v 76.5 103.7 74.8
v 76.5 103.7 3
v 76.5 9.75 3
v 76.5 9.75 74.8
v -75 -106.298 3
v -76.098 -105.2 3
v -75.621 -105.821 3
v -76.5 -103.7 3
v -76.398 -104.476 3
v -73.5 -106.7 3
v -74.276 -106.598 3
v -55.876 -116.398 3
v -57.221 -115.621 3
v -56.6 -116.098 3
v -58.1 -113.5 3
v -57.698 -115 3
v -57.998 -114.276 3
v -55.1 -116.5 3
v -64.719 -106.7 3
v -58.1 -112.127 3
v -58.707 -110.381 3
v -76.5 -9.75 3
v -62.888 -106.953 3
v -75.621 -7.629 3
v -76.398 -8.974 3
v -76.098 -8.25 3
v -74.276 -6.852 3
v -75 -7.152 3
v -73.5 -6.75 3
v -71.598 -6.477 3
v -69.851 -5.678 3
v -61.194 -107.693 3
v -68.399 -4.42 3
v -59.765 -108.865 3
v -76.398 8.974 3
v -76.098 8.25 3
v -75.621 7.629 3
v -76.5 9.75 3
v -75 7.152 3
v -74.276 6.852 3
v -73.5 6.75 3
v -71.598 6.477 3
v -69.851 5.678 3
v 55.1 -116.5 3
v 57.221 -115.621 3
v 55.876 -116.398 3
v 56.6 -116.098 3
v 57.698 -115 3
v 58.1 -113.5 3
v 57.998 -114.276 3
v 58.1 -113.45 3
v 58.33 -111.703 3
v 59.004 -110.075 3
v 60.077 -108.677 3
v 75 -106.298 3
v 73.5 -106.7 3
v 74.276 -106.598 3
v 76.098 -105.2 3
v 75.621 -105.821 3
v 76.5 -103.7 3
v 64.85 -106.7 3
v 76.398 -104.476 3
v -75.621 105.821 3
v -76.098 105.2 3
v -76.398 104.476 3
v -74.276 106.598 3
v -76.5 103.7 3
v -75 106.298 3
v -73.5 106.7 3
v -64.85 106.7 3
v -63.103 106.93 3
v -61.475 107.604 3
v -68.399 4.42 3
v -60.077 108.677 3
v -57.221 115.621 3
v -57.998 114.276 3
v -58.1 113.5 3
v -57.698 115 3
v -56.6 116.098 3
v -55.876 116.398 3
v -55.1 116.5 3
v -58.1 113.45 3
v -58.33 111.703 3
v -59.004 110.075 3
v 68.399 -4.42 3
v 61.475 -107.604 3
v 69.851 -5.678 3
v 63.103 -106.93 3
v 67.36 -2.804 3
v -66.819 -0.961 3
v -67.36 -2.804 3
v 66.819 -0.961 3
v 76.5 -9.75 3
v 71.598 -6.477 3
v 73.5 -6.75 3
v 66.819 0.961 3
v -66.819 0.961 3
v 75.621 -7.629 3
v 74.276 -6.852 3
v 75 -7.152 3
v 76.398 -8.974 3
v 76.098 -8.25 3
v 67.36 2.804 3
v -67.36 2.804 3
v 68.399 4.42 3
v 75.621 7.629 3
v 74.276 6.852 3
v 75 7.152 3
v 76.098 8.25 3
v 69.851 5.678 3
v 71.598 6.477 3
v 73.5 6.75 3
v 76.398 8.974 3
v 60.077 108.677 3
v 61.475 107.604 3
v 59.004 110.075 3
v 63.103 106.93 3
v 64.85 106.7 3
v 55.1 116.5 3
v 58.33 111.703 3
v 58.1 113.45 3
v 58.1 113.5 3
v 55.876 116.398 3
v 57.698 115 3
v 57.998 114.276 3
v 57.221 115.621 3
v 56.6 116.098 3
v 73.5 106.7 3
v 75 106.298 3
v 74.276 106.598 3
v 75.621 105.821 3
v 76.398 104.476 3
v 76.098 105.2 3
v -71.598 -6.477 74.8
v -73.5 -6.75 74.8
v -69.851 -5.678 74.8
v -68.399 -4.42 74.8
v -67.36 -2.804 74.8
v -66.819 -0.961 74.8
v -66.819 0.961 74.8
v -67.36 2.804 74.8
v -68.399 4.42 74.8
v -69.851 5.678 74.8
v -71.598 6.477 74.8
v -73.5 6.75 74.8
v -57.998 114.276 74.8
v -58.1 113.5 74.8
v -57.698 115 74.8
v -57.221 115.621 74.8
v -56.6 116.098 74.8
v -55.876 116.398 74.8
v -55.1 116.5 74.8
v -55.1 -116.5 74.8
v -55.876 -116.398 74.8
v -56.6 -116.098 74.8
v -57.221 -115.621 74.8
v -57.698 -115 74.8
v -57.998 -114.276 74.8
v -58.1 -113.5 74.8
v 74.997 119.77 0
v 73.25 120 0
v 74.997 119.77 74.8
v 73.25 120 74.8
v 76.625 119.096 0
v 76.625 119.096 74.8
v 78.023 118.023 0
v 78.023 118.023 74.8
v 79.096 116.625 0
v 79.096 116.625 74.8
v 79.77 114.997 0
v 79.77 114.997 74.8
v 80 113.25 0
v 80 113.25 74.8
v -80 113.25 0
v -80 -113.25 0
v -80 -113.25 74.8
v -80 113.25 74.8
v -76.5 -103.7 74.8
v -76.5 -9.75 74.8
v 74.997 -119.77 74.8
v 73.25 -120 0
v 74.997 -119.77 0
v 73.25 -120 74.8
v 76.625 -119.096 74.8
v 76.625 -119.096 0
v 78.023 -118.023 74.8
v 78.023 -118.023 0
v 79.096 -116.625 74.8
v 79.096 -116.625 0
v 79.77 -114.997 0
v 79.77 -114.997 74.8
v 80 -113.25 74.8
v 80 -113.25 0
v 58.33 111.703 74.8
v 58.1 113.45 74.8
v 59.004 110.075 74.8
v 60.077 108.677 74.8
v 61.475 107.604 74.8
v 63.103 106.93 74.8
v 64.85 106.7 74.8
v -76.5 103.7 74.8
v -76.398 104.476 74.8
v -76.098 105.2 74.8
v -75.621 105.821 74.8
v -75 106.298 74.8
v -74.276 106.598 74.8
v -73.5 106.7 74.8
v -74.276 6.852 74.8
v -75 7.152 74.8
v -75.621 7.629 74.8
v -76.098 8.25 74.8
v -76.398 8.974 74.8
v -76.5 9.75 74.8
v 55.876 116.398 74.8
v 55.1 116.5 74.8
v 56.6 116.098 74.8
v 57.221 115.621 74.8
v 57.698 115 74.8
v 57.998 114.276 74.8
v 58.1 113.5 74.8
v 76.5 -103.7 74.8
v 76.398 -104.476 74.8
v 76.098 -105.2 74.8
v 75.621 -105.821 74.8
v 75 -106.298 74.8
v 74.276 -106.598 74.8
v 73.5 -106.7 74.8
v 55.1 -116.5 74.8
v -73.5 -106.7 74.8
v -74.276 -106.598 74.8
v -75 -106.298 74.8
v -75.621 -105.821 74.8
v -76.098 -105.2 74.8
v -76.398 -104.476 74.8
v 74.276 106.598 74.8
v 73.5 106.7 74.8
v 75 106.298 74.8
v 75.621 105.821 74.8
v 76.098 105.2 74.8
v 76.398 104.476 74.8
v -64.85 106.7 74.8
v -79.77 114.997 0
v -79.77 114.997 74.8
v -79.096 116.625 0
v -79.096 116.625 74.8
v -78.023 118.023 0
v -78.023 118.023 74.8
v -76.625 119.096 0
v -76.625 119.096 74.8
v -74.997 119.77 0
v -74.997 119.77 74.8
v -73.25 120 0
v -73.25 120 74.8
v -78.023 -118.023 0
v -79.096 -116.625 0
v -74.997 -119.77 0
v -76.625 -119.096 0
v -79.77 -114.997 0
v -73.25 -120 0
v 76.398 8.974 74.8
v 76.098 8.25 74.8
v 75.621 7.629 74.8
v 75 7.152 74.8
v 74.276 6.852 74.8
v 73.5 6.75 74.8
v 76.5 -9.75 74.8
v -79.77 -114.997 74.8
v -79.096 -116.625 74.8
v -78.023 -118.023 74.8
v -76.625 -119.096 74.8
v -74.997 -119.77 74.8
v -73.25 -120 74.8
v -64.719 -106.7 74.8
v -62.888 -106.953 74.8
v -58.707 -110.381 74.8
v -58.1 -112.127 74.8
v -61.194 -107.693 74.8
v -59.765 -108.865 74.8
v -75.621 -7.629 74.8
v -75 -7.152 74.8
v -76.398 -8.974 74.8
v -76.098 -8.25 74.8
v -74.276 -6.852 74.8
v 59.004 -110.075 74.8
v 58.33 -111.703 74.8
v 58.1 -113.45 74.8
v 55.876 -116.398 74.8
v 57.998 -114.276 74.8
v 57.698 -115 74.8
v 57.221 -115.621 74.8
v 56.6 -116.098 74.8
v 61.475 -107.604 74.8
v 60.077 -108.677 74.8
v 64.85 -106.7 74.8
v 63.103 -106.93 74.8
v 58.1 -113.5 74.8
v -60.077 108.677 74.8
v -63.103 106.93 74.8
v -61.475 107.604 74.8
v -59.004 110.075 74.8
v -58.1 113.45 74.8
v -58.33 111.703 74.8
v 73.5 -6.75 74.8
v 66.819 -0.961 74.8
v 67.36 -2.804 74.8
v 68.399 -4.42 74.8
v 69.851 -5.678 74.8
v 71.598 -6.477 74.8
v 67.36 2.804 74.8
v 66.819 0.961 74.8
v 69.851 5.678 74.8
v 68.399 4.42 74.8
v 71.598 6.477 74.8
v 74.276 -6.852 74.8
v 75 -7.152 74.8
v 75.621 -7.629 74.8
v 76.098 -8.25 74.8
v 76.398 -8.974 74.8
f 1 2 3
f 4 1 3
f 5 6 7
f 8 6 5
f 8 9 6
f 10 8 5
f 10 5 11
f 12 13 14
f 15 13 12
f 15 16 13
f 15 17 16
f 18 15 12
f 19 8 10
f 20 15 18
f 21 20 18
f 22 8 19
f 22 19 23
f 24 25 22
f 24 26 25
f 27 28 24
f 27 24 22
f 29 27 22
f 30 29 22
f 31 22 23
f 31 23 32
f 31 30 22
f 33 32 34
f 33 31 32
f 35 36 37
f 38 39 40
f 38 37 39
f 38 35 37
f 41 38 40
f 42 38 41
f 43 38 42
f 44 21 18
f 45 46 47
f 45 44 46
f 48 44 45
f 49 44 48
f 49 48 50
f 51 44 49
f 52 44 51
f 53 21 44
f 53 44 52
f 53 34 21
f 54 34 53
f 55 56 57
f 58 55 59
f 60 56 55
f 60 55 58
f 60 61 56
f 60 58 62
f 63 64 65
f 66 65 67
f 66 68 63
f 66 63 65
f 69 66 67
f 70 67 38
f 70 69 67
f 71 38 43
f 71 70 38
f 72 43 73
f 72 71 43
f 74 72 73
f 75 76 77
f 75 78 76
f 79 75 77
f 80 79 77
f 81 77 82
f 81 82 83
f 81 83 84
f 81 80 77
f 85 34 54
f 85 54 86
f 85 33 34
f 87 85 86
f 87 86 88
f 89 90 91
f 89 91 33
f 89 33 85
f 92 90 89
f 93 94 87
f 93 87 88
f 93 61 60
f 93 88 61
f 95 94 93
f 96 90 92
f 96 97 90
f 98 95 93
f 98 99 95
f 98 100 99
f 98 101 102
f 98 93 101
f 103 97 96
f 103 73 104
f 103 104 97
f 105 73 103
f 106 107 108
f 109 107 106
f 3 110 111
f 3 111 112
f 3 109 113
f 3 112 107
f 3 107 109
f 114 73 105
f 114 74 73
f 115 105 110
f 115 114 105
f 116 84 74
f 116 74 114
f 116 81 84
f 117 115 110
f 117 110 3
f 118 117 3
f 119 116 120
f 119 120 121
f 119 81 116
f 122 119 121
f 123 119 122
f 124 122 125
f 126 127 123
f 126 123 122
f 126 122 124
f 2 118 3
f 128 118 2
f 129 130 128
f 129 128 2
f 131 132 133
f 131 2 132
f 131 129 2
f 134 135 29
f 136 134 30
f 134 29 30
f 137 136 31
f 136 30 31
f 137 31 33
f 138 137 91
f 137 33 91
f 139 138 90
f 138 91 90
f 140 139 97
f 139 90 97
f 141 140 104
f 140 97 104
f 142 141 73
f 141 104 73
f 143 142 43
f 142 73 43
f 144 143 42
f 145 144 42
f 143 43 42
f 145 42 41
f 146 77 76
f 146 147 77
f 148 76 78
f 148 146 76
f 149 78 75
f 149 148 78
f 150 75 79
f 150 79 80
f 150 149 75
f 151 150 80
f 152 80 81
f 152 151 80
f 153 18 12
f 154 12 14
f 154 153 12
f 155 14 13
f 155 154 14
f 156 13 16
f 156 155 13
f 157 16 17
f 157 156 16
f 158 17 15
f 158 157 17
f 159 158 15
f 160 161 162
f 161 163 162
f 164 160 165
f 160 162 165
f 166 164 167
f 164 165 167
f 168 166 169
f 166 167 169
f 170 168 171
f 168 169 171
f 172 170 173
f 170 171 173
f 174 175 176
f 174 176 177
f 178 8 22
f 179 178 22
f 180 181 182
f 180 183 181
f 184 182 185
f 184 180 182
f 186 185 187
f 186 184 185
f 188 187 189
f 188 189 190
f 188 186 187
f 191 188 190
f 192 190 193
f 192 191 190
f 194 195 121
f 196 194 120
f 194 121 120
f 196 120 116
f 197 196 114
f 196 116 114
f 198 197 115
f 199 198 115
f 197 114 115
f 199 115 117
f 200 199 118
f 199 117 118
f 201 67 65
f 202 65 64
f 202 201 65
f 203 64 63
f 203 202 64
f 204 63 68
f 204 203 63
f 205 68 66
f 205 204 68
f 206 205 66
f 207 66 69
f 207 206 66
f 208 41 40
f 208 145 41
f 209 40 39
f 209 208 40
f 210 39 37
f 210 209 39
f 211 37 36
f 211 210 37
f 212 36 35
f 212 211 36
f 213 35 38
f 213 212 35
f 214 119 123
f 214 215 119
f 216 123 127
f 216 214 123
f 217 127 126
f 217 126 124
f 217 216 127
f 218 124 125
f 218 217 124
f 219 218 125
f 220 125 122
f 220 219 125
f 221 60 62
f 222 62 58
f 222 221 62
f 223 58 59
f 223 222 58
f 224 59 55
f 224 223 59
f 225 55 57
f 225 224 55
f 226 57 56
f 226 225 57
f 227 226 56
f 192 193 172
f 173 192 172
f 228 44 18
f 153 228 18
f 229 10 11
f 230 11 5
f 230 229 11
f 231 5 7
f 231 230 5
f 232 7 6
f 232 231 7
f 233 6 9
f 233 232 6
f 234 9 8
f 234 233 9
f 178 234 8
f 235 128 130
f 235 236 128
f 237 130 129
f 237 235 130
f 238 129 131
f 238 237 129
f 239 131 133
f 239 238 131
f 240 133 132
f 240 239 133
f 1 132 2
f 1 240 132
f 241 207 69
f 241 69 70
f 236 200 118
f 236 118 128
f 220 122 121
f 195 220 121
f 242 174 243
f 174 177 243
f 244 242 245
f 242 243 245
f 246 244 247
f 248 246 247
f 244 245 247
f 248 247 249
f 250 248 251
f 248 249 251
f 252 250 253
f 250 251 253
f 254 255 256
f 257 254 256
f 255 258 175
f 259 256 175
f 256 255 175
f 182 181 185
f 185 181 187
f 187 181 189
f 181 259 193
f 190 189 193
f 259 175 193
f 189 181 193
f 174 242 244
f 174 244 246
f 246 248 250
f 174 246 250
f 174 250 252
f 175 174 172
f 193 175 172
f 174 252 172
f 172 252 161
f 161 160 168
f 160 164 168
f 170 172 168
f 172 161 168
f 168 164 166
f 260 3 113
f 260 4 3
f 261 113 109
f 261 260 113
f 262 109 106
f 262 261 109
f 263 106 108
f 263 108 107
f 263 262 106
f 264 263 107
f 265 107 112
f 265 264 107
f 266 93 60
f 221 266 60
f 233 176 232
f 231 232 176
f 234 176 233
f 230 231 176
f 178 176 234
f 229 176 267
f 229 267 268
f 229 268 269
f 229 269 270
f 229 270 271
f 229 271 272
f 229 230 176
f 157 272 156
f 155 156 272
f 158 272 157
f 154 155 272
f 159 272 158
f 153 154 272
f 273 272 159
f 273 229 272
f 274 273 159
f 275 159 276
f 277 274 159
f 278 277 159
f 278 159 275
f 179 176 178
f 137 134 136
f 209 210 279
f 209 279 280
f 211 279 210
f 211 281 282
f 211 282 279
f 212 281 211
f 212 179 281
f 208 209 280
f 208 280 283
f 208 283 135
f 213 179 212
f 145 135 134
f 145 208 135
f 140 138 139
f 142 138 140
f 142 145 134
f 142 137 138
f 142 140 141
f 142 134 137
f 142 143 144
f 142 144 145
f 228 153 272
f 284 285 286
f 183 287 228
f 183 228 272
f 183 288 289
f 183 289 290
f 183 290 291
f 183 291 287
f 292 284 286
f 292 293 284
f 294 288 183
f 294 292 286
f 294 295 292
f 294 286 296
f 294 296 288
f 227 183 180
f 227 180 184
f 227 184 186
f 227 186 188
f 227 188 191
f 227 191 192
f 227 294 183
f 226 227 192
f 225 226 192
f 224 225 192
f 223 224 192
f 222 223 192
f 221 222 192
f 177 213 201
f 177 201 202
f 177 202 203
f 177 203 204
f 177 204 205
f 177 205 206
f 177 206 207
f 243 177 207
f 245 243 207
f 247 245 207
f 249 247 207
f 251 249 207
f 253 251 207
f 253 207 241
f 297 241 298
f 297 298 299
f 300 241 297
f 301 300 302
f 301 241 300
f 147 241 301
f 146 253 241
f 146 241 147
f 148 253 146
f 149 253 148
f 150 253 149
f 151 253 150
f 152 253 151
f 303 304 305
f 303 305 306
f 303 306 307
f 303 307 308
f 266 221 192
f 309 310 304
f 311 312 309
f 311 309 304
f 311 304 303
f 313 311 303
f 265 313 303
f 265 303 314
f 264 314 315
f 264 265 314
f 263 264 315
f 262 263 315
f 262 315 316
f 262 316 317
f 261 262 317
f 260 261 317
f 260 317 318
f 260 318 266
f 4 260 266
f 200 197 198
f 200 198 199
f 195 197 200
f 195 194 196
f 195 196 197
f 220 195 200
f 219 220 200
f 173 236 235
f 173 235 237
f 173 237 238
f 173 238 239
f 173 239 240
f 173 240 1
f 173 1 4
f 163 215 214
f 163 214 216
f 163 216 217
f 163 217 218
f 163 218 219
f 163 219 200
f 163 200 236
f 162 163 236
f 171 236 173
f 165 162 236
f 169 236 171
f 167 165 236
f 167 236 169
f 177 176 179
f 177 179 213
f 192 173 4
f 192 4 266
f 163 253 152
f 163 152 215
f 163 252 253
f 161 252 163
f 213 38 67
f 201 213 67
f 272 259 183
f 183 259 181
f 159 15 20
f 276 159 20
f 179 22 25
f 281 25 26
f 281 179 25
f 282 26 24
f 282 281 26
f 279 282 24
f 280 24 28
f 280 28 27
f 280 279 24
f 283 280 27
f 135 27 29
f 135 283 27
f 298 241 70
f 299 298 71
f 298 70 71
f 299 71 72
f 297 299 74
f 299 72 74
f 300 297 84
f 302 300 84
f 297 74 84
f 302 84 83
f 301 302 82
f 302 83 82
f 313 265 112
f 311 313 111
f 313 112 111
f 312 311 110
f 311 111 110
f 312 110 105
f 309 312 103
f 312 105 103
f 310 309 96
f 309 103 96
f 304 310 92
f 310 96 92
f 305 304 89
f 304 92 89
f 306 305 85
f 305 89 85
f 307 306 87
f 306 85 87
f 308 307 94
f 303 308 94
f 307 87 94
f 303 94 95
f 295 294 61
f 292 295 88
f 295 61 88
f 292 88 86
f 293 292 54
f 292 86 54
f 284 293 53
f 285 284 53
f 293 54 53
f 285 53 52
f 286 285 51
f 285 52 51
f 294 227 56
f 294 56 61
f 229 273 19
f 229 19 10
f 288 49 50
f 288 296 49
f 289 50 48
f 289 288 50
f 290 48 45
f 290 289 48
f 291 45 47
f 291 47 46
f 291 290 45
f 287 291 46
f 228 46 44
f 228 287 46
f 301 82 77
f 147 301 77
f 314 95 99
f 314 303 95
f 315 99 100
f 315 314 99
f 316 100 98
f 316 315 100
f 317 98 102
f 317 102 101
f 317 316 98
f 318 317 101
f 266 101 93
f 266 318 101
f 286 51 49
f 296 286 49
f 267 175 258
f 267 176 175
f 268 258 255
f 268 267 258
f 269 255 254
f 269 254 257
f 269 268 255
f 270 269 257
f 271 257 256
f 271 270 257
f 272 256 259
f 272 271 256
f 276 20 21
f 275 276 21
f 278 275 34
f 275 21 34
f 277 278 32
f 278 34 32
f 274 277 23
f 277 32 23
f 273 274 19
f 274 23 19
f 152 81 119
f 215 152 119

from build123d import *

# Parameters (mm, degrees)
F1_DEPTH = 3
F0_W     = 160
F0_H     = 240
F2_DEPTH = 74.8
F3_R     = 6.75
F4_R     = 2.99999


# Not quite as in the source:
# - a fillet or chamfer is up to 0.001 mm smaller than in the source, because OpenCascade refuses the exact size
# - ends of sketch curves that miss each other by under 0.0002 mm in the source are joined


with BuildPart() as f1:
    # F0 (on Top) → F1 (new body)
    with BuildSketch(Plane.XY):
        with BuildLine():
            Line((58.1, 113.45), (58.1, 116.5))
            Line((58.1, 116.5), (-58.1, 116.5))
            Line((-58.1, 116.5), (-58.1, 113.45))
            ThreePointArc((-58.1, 113.45), (-60.077029227, 108.677029227), (-64.85, 106.7))
            Line((-64.85, 106.7), (-76.5, 106.7))
            Line((-76.5, 106.7), (-76.5, 6.75))
            Line((-76.5, 6.75), (-73.5, 6.75))
            ThreePointArc((-73.5, 6.75), (-66.75, 0), (-73.5, -6.75))
            Line((-73.5, -6.75), (-76.5, -6.75))
            Line((-76.5, -6.75), (-76.5, -106.7))
            Line((-76.5, -106.7), (-64.7190213203, -106.7))
            ThreePointArc((-64.7190213203, -106.7), (-60.4393955388, -108.2301050614), (-58.1, -112.1267249867))
            Line((-58.1, -112.1267249867), (-58.1, -116.5))
            Line((-58.1, -116.5), (58.1, -116.5))
            Line((58.1, -116.5), (58.1, -113.45))
            ThreePointArc((58.1, -113.45), (60.077029227, -108.677029227), (64.85, -106.7))
            Line((64.85, -106.7), (76.5, -106.7))
            Line((76.5, -106.7), (76.5, -6.75))
            Line((76.5, -6.75), (73.5, -6.75))
            ThreePointArc((73.5, -6.75), (66.75, 0), (73.5, 6.75))
            Line((73.5, 6.75), (76.5, 6.75))
            Line((76.5, 6.75), (76.5, 106.7))
            Line((76.5, 106.7), (64.85, 106.7))
            ThreePointArc((64.85, 106.7), (60.077029227, 108.677029227), (58.1, 113.45))
        make_face()
    extrude(amount=F1_DEPTH)

    # F0 (on Top) → F2 (join)
    with BuildSketch(Plane.XY):
        Rectangle(F0_W, F0_H)
        Polygon((58.1, 116.5), (76.5, 116.5), (76.5, 106.7), (76.5, 6.75), (76.5, -6.75), (76.5, -106.7), (76.5, -116.5), (58.1, -116.5), (-58.1, -116.5), (-76.5, -116.5), (-76.5, -106.7), (-76.5, -6.75), (-76.5, 6.75), (-76.5, 106.7), (-76.5, 116.5), (-58.1, 116.5), align=None, mode=Mode.SUBTRACT)
        with BuildLine():
            Line((-58.1, 113.45), (-58.1, 116.5))
            Line((-58.1, 116.5), (-76.5, 116.5))
            Line((-76.5, 116.5), (-76.5, 106.7))
            Line((-76.5, 106.7), (-64.85, 106.7))
            ThreePointArc((-64.85, 106.7), (-60.077029227, 108.677029227), (-58.1, 113.45))
        make_face()
        with BuildLine():
            Line((76.5, 106.7), (76.5, 116.5))
            Line((76.5, 116.5), (58.1, 116.5))
            Line((58.1, 116.5), (58.1, 113.45))
            ThreePointArc((58.1, 113.45), (60.077029227, 108.677029227), (64.85, 106.7))
            Line((64.85, 106.7), (76.5, 106.7))
        make_face()
        with BuildLine():
            Line((-73.5, 6.75), (-76.5, 6.75))
            Line((-76.5, 6.75), (-76.5, -6.75))
            Line((-76.5, -6.75), (-73.5, -6.75))
            ThreePointArc((-73.5, -6.75), (-66.75, 0), (-73.5, 6.75))
        make_face()
        with BuildLine():
            Line((76.5, -6.75), (76.5, 6.75))
            Line((76.5, 6.75), (73.5, 6.75))
            ThreePointArc((73.5, 6.75), (66.75, 0), (73.5, -6.75))
            Line((73.5, -6.75), (76.5, -6.75))
        make_face()
        with BuildLine():
            Line((-64.7190213203, -106.7), (-76.5, -106.7))
            Line((-76.5, -106.7), (-76.5, -116.5))
            Line((-76.5, -116.5), (-58.1, -116.5))
            Line((-58.1, -116.5), (-58.1, -112.1267249867))
            ThreePointArc((-58.1, -112.1267249867), (-60.4393955388, -108.2301050614), (-64.7190213203, -106.7))
        make_face()
        with BuildLine():
            Line((76.5, -116.5), (76.5, -106.7))
            Line((76.5, -106.7), (64.85, -106.7))
            ThreePointArc((64.85, -106.7), (60.077029227, -108.677029227), (58.1, -113.45))
            Line((58.1, -113.45), (58.1, -116.500006485))
            Line((58.1, -116.500006485), (76.5, -116.5))
        make_face()
    extrude(amount=F2_DEPTH)

    # F3
    f3_edges = [f1.edges().sort_by_distance(p)[0] for p in [
        (80, 120, 37.4),
        (-80, 120, 37.4),
        (-80, -120, 37.4),
        (80, -120, 37.4),
    ]]
    fillet(f3_edges, radius=F3_R)

    # F4 (radius 3 in the source; OpenCascade refuses exactly that, so slightly less here)
    f4_edges = [f1.edges().sort_by_distance(p)[0] for p in [
        (-76.5, 106.7, 38.9),
        (-58.1, 116.5, 38.9),
        (-76.5, -6.75, 38.9),
        (58.1, 116.5, 38.9),
        (76.5, 106.7, 38.9),
        (76.5, -6.75, 38.9),
        (-76.5, 6.75, 38.9),
        (-76.5, -106.7, 38.9),
        (-58.1, -116.5, 38.9),
        (76.5, 6.75, 38.9),
        (76.5, -106.7, 38.9),
        (58.1, -116.5, 38.9),
    ]]
    fillet(f4_edges, radius=F4_R)


solid = f1.part
